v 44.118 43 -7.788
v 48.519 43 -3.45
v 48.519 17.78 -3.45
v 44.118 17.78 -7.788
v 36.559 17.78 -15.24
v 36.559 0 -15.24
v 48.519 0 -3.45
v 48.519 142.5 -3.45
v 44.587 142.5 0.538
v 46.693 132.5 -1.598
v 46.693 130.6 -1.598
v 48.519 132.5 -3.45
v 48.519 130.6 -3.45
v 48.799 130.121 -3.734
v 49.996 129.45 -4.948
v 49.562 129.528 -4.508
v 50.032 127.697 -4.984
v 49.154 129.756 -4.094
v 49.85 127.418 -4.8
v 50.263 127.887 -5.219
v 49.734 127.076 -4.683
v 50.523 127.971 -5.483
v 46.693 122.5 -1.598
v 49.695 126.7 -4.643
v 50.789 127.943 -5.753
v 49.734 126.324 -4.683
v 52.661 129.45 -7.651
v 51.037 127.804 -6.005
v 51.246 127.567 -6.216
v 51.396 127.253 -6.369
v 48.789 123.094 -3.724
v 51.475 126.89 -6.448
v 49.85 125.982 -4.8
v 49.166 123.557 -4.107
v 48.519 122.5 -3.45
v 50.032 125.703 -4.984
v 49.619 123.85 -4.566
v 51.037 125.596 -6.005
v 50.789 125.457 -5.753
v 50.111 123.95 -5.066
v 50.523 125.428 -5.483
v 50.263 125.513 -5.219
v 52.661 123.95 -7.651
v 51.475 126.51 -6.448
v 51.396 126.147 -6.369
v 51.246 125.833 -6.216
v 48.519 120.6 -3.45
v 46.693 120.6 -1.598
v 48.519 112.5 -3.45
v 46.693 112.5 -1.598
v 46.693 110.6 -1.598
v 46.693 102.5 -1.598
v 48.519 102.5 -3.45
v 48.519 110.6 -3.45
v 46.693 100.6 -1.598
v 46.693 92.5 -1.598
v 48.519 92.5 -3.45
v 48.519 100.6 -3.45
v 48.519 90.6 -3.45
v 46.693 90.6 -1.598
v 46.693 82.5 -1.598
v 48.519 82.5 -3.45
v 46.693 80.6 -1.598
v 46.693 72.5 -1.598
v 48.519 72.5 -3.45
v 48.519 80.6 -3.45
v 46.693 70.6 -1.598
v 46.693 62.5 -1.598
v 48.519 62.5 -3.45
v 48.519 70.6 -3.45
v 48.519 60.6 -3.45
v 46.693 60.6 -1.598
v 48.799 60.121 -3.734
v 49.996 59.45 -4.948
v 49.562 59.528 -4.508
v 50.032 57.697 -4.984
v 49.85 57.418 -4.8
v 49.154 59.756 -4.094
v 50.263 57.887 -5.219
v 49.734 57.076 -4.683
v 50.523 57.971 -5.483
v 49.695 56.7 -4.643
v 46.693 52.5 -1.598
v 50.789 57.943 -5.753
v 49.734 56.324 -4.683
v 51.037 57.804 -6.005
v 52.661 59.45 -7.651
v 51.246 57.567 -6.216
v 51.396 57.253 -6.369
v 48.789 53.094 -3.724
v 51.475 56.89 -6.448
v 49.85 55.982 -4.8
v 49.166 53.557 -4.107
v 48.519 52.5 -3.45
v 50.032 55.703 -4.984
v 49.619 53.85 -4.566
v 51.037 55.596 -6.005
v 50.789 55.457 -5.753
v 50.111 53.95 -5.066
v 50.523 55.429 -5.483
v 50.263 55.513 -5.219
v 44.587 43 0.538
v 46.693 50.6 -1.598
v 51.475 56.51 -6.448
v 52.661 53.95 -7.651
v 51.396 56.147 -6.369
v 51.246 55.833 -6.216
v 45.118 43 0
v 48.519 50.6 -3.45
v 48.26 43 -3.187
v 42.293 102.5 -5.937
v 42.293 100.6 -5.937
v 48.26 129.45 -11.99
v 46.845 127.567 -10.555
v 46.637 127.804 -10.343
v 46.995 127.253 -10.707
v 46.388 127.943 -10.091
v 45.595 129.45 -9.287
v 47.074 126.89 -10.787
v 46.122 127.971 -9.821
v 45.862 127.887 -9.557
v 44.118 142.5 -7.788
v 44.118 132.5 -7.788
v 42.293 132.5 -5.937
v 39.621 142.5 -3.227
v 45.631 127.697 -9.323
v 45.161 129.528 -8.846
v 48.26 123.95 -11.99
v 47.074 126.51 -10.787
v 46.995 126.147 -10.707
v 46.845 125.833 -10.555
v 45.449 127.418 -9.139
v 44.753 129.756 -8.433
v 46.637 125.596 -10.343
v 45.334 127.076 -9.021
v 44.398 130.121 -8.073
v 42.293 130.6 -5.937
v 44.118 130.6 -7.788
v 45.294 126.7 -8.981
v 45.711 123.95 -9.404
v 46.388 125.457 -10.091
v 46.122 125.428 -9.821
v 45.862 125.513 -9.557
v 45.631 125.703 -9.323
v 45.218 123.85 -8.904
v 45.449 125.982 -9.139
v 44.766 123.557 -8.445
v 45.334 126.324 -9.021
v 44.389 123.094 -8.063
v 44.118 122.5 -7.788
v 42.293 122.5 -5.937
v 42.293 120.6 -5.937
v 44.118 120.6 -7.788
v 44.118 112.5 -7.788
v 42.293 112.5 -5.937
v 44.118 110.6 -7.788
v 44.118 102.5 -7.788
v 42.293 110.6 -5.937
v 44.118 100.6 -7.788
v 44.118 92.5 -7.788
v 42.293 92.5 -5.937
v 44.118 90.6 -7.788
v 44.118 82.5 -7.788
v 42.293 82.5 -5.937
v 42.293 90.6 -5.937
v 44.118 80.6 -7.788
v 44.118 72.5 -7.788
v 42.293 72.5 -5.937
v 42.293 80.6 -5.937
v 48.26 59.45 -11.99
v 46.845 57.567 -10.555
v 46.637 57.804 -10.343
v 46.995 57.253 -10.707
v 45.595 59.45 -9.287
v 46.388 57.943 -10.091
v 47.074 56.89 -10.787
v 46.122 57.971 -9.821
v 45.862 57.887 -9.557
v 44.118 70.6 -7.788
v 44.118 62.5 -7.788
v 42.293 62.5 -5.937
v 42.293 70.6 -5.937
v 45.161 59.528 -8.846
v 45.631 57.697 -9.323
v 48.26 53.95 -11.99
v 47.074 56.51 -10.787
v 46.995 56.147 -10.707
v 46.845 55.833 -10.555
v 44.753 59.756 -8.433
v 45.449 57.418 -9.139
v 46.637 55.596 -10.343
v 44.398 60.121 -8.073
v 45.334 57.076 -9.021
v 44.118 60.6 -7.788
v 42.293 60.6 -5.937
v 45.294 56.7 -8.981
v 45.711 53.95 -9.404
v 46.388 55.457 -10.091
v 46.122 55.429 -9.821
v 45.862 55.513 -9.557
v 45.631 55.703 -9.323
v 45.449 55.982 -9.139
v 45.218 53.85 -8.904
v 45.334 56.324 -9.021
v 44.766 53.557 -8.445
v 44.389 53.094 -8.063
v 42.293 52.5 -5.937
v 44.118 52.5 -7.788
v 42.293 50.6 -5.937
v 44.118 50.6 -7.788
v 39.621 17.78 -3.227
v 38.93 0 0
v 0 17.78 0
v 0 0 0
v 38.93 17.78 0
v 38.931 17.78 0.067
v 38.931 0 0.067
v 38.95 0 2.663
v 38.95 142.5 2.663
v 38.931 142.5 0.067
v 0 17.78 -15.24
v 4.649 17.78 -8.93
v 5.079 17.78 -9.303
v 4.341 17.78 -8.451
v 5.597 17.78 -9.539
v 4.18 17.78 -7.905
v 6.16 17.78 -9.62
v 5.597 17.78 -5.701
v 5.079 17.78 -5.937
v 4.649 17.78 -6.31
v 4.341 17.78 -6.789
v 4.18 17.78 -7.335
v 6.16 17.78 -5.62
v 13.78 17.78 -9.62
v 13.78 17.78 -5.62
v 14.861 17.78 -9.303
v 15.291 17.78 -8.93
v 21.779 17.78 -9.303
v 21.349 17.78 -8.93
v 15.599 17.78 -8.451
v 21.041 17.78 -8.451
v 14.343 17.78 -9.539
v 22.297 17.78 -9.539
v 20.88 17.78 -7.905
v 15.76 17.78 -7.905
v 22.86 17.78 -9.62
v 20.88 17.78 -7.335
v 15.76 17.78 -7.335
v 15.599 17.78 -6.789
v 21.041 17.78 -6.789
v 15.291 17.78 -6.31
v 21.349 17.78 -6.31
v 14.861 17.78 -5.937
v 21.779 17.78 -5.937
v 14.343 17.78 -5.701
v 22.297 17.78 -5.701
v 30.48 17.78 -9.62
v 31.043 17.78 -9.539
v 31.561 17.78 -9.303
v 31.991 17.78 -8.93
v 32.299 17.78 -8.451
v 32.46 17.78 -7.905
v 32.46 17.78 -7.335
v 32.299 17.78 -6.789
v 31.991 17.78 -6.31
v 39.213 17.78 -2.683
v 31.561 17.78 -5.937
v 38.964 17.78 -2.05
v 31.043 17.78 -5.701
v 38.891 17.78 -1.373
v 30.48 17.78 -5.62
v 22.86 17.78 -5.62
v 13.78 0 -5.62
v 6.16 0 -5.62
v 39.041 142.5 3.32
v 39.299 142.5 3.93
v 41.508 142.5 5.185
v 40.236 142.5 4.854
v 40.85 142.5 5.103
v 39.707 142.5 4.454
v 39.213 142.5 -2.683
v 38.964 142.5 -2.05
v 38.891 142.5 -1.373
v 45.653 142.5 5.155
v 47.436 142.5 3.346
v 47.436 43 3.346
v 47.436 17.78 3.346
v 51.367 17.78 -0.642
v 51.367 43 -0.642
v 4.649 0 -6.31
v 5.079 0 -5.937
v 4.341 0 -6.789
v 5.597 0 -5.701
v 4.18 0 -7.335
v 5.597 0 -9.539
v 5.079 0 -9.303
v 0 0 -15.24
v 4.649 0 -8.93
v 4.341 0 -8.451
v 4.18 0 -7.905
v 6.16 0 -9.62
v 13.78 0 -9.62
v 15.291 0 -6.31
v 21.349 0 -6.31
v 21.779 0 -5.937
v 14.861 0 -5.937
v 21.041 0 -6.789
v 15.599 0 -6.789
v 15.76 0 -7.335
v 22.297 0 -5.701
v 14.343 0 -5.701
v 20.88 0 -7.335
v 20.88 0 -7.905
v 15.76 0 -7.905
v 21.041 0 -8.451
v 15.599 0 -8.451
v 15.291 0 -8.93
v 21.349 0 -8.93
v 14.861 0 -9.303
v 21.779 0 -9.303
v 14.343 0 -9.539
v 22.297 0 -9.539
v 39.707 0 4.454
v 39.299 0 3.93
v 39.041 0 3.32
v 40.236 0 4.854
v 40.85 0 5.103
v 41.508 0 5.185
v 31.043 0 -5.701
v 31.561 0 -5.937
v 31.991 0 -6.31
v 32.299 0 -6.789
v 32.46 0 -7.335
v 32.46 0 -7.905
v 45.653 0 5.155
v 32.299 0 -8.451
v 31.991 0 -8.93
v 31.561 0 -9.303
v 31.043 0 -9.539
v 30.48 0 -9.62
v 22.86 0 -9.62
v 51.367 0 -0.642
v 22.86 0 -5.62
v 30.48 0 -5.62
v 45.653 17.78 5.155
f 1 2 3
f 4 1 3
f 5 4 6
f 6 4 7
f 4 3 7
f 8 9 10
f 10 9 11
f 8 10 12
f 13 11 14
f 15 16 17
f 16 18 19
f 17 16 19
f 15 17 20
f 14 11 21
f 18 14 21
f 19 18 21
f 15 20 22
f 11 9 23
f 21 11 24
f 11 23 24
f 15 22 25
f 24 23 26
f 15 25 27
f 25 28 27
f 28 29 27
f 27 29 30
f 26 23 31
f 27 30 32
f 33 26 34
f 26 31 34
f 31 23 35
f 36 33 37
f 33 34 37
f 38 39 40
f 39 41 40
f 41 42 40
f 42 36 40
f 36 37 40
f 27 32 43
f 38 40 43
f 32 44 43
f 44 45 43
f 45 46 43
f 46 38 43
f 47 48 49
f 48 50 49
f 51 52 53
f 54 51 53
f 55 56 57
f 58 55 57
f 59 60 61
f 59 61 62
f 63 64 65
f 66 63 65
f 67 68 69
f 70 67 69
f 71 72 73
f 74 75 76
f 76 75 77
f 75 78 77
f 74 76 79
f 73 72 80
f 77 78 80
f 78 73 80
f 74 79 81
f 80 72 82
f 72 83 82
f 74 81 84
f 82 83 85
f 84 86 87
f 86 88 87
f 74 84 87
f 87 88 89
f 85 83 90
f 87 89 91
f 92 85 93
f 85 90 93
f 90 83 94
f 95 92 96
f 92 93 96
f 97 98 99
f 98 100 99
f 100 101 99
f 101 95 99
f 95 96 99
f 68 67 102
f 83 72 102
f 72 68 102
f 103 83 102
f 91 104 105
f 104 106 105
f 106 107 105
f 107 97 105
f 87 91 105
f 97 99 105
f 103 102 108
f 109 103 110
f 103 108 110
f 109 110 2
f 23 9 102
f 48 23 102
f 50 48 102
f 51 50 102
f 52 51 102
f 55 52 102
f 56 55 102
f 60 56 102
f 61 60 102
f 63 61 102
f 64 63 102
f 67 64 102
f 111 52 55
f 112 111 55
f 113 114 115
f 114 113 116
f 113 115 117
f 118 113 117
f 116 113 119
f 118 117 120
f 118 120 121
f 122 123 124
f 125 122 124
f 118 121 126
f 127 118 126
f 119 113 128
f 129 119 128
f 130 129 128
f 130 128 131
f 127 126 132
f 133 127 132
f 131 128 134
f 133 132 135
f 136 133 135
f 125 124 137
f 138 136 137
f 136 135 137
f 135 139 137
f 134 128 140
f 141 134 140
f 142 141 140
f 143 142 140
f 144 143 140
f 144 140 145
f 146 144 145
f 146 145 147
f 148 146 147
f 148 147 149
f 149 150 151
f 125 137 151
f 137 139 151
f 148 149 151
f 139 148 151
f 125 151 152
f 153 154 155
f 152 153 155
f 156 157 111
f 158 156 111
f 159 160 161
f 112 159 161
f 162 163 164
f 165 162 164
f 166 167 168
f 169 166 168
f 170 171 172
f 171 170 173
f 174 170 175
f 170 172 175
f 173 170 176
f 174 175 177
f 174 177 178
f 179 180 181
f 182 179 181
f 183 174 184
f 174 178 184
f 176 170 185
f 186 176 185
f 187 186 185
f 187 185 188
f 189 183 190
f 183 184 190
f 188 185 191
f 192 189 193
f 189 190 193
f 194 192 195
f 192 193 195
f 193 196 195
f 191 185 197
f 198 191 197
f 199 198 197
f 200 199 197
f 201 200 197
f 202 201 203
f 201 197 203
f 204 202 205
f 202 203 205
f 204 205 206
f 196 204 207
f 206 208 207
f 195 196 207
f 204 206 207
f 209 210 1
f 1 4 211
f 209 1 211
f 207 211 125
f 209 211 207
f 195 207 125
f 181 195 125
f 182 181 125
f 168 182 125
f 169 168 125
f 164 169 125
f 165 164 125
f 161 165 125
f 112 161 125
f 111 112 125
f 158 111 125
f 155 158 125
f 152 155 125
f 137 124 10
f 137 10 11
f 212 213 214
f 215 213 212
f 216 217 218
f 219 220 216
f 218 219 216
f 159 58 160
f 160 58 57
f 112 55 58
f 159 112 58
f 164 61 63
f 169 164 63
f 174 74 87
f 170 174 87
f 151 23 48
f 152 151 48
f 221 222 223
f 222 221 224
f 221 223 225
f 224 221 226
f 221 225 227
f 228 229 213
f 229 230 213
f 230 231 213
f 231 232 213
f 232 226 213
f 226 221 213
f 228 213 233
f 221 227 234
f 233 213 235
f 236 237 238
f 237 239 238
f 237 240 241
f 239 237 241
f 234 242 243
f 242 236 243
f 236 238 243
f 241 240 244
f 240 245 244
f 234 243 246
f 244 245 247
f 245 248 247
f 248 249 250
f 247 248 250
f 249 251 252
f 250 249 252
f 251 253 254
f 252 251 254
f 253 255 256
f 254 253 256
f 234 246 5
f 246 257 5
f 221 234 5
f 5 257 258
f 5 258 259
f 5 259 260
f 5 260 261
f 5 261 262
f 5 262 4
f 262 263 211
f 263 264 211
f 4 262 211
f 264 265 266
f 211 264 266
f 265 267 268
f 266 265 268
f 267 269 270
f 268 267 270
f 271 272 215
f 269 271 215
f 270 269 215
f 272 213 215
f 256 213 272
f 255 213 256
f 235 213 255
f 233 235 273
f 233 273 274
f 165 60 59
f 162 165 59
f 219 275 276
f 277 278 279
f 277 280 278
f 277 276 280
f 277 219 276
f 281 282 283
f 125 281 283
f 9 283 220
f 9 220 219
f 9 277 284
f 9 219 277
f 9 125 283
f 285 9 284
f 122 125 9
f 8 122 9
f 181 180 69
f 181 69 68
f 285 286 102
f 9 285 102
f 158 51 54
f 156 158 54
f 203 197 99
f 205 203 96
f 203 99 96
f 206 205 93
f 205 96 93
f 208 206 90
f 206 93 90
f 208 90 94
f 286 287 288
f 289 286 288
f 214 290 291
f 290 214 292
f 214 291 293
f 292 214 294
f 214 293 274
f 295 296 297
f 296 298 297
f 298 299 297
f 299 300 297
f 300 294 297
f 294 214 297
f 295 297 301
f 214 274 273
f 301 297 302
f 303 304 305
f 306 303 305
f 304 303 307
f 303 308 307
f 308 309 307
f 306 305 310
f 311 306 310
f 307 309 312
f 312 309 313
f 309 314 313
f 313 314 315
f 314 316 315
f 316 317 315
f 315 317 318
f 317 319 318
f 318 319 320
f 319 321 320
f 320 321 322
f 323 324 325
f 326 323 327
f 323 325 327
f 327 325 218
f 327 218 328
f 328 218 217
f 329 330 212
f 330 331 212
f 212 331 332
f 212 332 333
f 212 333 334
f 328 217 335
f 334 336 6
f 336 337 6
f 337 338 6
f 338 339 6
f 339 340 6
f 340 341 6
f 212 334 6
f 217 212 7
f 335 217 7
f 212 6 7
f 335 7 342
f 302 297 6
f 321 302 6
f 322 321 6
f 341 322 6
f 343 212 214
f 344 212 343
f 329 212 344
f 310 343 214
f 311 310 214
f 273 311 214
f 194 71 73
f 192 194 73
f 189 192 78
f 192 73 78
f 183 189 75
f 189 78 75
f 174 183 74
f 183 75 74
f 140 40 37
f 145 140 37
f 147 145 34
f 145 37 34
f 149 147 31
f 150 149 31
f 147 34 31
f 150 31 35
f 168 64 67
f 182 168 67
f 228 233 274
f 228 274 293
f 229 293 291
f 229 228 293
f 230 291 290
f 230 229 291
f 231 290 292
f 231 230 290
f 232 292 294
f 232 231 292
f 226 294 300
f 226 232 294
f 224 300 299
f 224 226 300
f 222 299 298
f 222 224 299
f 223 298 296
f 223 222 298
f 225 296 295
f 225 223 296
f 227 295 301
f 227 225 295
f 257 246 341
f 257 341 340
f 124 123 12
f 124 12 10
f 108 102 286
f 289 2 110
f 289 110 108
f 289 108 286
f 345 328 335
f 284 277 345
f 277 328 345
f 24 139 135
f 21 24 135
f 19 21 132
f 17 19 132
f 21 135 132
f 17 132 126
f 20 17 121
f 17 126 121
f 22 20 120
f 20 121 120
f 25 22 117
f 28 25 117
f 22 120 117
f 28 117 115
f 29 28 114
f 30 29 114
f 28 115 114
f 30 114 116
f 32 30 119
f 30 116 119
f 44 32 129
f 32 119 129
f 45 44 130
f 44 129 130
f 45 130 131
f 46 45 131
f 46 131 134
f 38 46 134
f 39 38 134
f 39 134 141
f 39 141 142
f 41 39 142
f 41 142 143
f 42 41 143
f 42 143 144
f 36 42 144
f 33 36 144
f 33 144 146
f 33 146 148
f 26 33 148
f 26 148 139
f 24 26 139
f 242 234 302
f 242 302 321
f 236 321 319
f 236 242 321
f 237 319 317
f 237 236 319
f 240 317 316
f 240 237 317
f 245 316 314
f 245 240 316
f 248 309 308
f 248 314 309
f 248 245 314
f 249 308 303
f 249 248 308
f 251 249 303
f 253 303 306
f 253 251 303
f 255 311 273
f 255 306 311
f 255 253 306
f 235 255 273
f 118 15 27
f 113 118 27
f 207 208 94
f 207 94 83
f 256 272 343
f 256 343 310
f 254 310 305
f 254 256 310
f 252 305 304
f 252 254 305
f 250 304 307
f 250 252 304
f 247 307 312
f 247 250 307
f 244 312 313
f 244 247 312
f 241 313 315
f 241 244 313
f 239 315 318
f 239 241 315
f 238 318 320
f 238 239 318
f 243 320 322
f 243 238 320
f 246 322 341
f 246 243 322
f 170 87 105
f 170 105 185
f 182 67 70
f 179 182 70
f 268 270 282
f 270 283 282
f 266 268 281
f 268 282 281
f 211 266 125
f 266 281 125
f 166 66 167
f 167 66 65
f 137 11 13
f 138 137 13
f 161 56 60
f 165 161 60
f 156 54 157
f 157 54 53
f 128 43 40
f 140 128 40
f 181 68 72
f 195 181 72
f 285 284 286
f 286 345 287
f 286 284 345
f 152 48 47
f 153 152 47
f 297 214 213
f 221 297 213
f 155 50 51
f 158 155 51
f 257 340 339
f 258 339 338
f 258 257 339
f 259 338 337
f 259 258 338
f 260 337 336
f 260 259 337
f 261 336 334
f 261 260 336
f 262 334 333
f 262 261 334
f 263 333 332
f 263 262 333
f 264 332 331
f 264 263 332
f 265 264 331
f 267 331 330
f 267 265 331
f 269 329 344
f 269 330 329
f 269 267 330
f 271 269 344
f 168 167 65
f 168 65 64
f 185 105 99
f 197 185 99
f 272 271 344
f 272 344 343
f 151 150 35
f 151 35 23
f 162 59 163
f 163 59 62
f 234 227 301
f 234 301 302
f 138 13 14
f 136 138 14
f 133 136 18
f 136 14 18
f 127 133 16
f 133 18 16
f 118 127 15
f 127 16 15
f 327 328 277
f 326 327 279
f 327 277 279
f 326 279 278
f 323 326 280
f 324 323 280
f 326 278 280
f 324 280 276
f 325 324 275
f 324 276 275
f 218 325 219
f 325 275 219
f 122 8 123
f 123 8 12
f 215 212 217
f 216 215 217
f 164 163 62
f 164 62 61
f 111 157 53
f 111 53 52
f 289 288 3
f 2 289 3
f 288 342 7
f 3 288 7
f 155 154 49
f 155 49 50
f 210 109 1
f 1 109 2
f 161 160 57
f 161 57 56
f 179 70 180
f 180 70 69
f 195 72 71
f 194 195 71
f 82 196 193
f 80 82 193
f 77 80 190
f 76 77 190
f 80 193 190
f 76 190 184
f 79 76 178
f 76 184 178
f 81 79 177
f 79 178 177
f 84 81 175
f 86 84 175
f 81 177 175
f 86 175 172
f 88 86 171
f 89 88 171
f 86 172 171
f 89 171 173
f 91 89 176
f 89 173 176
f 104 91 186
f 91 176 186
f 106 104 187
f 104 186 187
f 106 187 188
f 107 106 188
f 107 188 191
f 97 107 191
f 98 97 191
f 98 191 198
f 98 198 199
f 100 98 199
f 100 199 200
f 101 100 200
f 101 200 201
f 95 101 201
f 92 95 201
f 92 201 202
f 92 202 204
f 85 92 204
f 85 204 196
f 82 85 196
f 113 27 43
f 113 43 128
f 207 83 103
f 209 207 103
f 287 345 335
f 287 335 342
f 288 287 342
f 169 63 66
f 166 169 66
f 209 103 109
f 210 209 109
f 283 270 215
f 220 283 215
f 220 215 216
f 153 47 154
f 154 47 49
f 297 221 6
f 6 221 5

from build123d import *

# Parameters (mm, degrees)
SKETCH1_W                                 = 48.26
SKETCH1_H                                 = 17.78
BOSS_EXTRUDE1_DEPTH                       = 15.24
CUT_EXTRUDE2_DEPTH                        = 18.78
BOSS_EXTRUDE7_DEPTH                       = 124.7199944
BOSS_EXTRUDE10_DEPTH                      = 17.78
BOSS_EXTRUDE11_DEPTH                      = 25.2199902
TAPPED_HOLE_FOR_M2_5X0_45_HELICOIL1_D     = 2.55
TAPPED_HOLE_FOR_M2_5X0_45_HELICOIL1_DEPTH = 6.179587557
CUT_EXTRUDE3_DEPTH                        = 43.829137561
FILLET1_R                                 = 2.54
FILLET2_R                                 = 2.54


with BuildPart() as part:
    # Sketch1 → Boss-Extrude1 (new body)
    with BuildSketch(Plane.XY):
        with Locations((24.13, 8.89)):
            Rectangle(SKETCH1_W, SKETCH1_H)
    extrude(amount=-BOSS_EXTRUDE1_DEPTH)

    # Sketch4 → Cut-Extrude2 (cut, through all)
    with BuildSketch(Plane(origin=(0, 17.78, 0), x_dir=(1, 0, 0), z_dir=(0, 1, 0))):
        with BuildLine():
            Line((30.48, 5.62), (22.86, 5.62))
            ThreePointArc((22.86, 5.62), (20.86, 7.62), (22.86, 9.62))
            Line((22.86, 9.62), (30.48, 9.62))
            ThreePointArc((30.48, 9.62), (32.48, 7.62), (30.48, 5.62))
        make_face()
        with BuildLine():
            Line((13.78, 5.62), (6.16, 5.62))
            ThreePointArc((6.16, 5.62), (4.16, 7.62), (6.16, 9.62))
            Line((6.16, 9.62), (13.78, 9.62))
            ThreePointArc((13.78, 9.62), (15.78, 7.62), (13.78, 5.62))
        make_face()
    extrude(amount=-CUT_EXTRUDE2_DEPTH, mode=Mode.SUBTRACT)

    # Sketch3 → Boss-Extrude7 (add)
    with BuildSketch(Plane(origin=(0, 17.78, 0), x_dir=(1, 0, 0), z_dir=(0, 1, 0))):
        Polygon((38.861027897, 2.455591764), (38.931451129, -0.066795908), (38.96812041, -5.202868615), (45.652609046, -5.155144331), (47.435791814, -3.346316197), (44.587248028, -0.538158749), (52.660713317, 7.651417444), (48.26, 11.989737935), align=None)
    extrude(amount=BOSS_EXTRUDE7_DEPTH)

    # Sketch3<15> → Boss-Extrude10 (add, through all)
    with BuildSketch(Plane(origin=(0, 17.78, 0), x_dir=(1, 0, 0), z_dir=(0, 1, 0))):
        Polygon((38.929586235, 0), (38.931451129, -0.066795908), (38.96812041, -5.202868615), (45.652609046, -5.155144331), (51.367206426, 0.641639204), (48.518662639, 3.449796653), (52.660713317, 7.651417444), (48.26, 11.989737935), (48.26, 0), align=None)
    extrude(amount=-BOSS_EXTRUDE10_DEPTH)

    # Sketch3<16> → Boss-Extrude11 (add)
    with BuildSketch(Plane(origin=(0, 17.78, 0), x_dir=(1, 0, 0), z_dir=(0, 1, 0))):
        Polygon((48.26, 0), (45.117776821, 0), (44.587248028, -0.538158749), (47.435791814, -3.346316197), (51.367206426, 0.641639204), (48.518662639, 3.449796653), (48.26, 3.187413981), align=None)
        Polygon((48.26, 3.187413981), (45.117776821, 0), (48.26, 0), align=None)
    extrude(amount=BOSS_EXTRUDE11_DEPTH)

    # Tapped Hole for M2.5x0.45 Helicoil1
    with Locations(Plane(origin=(72.176615664, -14.555024135, -27.447993454), x_dir=(0.70204046, 0, -0.71213706), z_dir=(0.71213706, 0, 0.70204046))):
        with Locations((-30.748832903, 71.255012335), (-30.748832903, 141.254872335)):
            Hole(TAPPED_HOLE_FOR_M2_5X0_45_HELICOIL1_D / 2, depth=TAPPED_HOLE_FOR_M2_5X0_45_HELICOIL1_DEPTH)

    # Sketch10 → Cut-Extrude3 (cut, through all)
    with BuildSketch(Plane(origin=(22.88099291, 0, 22.556588727), x_dir=(0.70204046, 0, -0.71213706), z_dir=(0.71213706, 0, 0.70204046))):
        with BuildLine():
            Line((44.733441395, 142.4999944), (36.518809323, 142.4999944))
            Line((36.518809323, 142.4999944), (36.518802204, 132.4999944))
            Line((36.518802204, 132.4999944), (33.918802204, 132.499996251))
            Line((33.918802204, 132.499996251), (33.918800852, 130.599996251))
            Line((33.918800852, 130.599996251), (36.518800852, 130.5999944))
            ThreePointArc((36.518800852, 130.5999944), (37.424004911, 129.756252659), (38.622962574, 129.449992902))
            Line((38.622962574, 129.449992902), (42.418809323, 129.4499902))
            Line((42.418809323, 129.4499902), (42.418809323, 123.9499902))
            Line((42.418809323, 123.9499902), (38.787619584, 123.9499902))
            ThreePointArc((38.787619584, 123.9499902), (37.441328382, 123.556527643), (36.518809323, 122.4999902))
            Line((36.518809323, 122.4999902), (33.918809323, 122.4999902))
            Line((33.918809323, 122.4999902), (33.918809323, 120.5999902))
            Line((33.918809323, 120.5999902), (36.518809323, 120.5999902))
            Line((36.518809323, 120.5999902), (36.518809323, 112.4999902))
            Line((36.518809323, 112.4999902), (33.918809323, 112.4999902))
            Line((33.918809323, 112.4999902), (33.918809323, 110.5999902))
            Line((33.918809323, 110.5999902), (36.518809323, 110.5999902))
            Line((36.518809323, 110.5999902), (36.518809323, 102.4999902))
            Line((36.518809323, 102.4999902), (33.918809323, 102.4999902))
            Line((33.918809323, 102.4999902), (33.918809323, 100.5999902))
            Line((33.918809323, 100.5999902), (36.518809323, 100.5999902))
            Line((36.518809323, 100.5999902), (36.518809323, 92.4999902))
            Line((36.518809323, 92.4999902), (33.918809323, 92.4999902))
            Line((33.918809323, 92.4999902), (33.918809323, 90.5999902))
            Line((33.918809323, 90.5999902), (36.518809323, 90.5999902))
            Line((36.518809323, 90.5999902), (36.518809323, 82.4999902))
            Line((36.518809323, 82.4999902), (33.918809323, 82.4999902))
            Line((33.918809323, 82.4999902), (33.918809323, 80.5999902))
            Line((33.918809323, 80.5999902), (36.518809323, 80.5999902))
            Line((36.518809323, 80.5999902), (36.518809323, 72.4999902))
            Line((36.518809323, 72.4999902), (33.918809323, 72.4999902))
            Line((33.918809323, 72.4999902), (33.918809323, 70.5999902))
            Line((33.918809323, 70.5999902), (36.518809323, 70.5999902))
            Line((36.518809323, 70.5999902), (36.518809323, 62.4999902))
            Line((36.518809323, 62.4999902), (33.918809323, 62.4999902))
            Line((33.918809323, 62.4999902), (33.918809323, 60.5999902))
            Line((33.918809323, 60.5999902), (36.518809323, 60.5999902))
            ThreePointArc((36.518809323, 60.5999902), (37.424013983, 59.756249103), (38.622971864, 59.4499902))
            Line((38.622971864, 59.4499902), (42.418809323, 59.4499902))
            Line((42.418809323, 59.4499902), (42.418809323, 53.9499902))
            Line((42.418809323, 53.9499902), (38.787619584, 53.9499902))
            ThreePointArc((38.787619584, 53.9499902), (37.441328382, 53.556527643), (36.518809323, 52.4999902))
            Line((36.518809323, 52.4999902), (33.918809323, 52.4999902))
            Line((33.918809323, 52.4999902), (33.918809323, 50.5999902))
            Line((33.918809323, 50.5999902), (36.518809323, 50.5999902))
            Line((36.518809323, 50.5999902), (36.518809323, 42.9999902))
            Line((36.518809323, 42.9999902), (36.518792281, 0))
            Line((36.518792281, 0), (44.733441395, 0))
            Line((44.733441395, 0), (44.733441395, 142.4999944))
        make_face()
    extrude(amount=-CUT_EXTRUDE3_DEPTH, mode=Mode.SUBTRACT)

    # Fillet1
    fillet1_edges = [part.edges().sort_by_distance(p)[0] for p in [
        (38.96812041, 71.2499972, 5.202868615),
    ]]
    fillet(fillet1_edges, radius=FILLET1_R)

    # Fillet2
    fillet2_edges = [part.edges().sort_by_distance(p)[0] for p in [
        (38.861027897, 80.1399972, -2.455591764),
    ]]
    fillet(fillet2_edges, radius=FILLET2_R)


solid = part.part
